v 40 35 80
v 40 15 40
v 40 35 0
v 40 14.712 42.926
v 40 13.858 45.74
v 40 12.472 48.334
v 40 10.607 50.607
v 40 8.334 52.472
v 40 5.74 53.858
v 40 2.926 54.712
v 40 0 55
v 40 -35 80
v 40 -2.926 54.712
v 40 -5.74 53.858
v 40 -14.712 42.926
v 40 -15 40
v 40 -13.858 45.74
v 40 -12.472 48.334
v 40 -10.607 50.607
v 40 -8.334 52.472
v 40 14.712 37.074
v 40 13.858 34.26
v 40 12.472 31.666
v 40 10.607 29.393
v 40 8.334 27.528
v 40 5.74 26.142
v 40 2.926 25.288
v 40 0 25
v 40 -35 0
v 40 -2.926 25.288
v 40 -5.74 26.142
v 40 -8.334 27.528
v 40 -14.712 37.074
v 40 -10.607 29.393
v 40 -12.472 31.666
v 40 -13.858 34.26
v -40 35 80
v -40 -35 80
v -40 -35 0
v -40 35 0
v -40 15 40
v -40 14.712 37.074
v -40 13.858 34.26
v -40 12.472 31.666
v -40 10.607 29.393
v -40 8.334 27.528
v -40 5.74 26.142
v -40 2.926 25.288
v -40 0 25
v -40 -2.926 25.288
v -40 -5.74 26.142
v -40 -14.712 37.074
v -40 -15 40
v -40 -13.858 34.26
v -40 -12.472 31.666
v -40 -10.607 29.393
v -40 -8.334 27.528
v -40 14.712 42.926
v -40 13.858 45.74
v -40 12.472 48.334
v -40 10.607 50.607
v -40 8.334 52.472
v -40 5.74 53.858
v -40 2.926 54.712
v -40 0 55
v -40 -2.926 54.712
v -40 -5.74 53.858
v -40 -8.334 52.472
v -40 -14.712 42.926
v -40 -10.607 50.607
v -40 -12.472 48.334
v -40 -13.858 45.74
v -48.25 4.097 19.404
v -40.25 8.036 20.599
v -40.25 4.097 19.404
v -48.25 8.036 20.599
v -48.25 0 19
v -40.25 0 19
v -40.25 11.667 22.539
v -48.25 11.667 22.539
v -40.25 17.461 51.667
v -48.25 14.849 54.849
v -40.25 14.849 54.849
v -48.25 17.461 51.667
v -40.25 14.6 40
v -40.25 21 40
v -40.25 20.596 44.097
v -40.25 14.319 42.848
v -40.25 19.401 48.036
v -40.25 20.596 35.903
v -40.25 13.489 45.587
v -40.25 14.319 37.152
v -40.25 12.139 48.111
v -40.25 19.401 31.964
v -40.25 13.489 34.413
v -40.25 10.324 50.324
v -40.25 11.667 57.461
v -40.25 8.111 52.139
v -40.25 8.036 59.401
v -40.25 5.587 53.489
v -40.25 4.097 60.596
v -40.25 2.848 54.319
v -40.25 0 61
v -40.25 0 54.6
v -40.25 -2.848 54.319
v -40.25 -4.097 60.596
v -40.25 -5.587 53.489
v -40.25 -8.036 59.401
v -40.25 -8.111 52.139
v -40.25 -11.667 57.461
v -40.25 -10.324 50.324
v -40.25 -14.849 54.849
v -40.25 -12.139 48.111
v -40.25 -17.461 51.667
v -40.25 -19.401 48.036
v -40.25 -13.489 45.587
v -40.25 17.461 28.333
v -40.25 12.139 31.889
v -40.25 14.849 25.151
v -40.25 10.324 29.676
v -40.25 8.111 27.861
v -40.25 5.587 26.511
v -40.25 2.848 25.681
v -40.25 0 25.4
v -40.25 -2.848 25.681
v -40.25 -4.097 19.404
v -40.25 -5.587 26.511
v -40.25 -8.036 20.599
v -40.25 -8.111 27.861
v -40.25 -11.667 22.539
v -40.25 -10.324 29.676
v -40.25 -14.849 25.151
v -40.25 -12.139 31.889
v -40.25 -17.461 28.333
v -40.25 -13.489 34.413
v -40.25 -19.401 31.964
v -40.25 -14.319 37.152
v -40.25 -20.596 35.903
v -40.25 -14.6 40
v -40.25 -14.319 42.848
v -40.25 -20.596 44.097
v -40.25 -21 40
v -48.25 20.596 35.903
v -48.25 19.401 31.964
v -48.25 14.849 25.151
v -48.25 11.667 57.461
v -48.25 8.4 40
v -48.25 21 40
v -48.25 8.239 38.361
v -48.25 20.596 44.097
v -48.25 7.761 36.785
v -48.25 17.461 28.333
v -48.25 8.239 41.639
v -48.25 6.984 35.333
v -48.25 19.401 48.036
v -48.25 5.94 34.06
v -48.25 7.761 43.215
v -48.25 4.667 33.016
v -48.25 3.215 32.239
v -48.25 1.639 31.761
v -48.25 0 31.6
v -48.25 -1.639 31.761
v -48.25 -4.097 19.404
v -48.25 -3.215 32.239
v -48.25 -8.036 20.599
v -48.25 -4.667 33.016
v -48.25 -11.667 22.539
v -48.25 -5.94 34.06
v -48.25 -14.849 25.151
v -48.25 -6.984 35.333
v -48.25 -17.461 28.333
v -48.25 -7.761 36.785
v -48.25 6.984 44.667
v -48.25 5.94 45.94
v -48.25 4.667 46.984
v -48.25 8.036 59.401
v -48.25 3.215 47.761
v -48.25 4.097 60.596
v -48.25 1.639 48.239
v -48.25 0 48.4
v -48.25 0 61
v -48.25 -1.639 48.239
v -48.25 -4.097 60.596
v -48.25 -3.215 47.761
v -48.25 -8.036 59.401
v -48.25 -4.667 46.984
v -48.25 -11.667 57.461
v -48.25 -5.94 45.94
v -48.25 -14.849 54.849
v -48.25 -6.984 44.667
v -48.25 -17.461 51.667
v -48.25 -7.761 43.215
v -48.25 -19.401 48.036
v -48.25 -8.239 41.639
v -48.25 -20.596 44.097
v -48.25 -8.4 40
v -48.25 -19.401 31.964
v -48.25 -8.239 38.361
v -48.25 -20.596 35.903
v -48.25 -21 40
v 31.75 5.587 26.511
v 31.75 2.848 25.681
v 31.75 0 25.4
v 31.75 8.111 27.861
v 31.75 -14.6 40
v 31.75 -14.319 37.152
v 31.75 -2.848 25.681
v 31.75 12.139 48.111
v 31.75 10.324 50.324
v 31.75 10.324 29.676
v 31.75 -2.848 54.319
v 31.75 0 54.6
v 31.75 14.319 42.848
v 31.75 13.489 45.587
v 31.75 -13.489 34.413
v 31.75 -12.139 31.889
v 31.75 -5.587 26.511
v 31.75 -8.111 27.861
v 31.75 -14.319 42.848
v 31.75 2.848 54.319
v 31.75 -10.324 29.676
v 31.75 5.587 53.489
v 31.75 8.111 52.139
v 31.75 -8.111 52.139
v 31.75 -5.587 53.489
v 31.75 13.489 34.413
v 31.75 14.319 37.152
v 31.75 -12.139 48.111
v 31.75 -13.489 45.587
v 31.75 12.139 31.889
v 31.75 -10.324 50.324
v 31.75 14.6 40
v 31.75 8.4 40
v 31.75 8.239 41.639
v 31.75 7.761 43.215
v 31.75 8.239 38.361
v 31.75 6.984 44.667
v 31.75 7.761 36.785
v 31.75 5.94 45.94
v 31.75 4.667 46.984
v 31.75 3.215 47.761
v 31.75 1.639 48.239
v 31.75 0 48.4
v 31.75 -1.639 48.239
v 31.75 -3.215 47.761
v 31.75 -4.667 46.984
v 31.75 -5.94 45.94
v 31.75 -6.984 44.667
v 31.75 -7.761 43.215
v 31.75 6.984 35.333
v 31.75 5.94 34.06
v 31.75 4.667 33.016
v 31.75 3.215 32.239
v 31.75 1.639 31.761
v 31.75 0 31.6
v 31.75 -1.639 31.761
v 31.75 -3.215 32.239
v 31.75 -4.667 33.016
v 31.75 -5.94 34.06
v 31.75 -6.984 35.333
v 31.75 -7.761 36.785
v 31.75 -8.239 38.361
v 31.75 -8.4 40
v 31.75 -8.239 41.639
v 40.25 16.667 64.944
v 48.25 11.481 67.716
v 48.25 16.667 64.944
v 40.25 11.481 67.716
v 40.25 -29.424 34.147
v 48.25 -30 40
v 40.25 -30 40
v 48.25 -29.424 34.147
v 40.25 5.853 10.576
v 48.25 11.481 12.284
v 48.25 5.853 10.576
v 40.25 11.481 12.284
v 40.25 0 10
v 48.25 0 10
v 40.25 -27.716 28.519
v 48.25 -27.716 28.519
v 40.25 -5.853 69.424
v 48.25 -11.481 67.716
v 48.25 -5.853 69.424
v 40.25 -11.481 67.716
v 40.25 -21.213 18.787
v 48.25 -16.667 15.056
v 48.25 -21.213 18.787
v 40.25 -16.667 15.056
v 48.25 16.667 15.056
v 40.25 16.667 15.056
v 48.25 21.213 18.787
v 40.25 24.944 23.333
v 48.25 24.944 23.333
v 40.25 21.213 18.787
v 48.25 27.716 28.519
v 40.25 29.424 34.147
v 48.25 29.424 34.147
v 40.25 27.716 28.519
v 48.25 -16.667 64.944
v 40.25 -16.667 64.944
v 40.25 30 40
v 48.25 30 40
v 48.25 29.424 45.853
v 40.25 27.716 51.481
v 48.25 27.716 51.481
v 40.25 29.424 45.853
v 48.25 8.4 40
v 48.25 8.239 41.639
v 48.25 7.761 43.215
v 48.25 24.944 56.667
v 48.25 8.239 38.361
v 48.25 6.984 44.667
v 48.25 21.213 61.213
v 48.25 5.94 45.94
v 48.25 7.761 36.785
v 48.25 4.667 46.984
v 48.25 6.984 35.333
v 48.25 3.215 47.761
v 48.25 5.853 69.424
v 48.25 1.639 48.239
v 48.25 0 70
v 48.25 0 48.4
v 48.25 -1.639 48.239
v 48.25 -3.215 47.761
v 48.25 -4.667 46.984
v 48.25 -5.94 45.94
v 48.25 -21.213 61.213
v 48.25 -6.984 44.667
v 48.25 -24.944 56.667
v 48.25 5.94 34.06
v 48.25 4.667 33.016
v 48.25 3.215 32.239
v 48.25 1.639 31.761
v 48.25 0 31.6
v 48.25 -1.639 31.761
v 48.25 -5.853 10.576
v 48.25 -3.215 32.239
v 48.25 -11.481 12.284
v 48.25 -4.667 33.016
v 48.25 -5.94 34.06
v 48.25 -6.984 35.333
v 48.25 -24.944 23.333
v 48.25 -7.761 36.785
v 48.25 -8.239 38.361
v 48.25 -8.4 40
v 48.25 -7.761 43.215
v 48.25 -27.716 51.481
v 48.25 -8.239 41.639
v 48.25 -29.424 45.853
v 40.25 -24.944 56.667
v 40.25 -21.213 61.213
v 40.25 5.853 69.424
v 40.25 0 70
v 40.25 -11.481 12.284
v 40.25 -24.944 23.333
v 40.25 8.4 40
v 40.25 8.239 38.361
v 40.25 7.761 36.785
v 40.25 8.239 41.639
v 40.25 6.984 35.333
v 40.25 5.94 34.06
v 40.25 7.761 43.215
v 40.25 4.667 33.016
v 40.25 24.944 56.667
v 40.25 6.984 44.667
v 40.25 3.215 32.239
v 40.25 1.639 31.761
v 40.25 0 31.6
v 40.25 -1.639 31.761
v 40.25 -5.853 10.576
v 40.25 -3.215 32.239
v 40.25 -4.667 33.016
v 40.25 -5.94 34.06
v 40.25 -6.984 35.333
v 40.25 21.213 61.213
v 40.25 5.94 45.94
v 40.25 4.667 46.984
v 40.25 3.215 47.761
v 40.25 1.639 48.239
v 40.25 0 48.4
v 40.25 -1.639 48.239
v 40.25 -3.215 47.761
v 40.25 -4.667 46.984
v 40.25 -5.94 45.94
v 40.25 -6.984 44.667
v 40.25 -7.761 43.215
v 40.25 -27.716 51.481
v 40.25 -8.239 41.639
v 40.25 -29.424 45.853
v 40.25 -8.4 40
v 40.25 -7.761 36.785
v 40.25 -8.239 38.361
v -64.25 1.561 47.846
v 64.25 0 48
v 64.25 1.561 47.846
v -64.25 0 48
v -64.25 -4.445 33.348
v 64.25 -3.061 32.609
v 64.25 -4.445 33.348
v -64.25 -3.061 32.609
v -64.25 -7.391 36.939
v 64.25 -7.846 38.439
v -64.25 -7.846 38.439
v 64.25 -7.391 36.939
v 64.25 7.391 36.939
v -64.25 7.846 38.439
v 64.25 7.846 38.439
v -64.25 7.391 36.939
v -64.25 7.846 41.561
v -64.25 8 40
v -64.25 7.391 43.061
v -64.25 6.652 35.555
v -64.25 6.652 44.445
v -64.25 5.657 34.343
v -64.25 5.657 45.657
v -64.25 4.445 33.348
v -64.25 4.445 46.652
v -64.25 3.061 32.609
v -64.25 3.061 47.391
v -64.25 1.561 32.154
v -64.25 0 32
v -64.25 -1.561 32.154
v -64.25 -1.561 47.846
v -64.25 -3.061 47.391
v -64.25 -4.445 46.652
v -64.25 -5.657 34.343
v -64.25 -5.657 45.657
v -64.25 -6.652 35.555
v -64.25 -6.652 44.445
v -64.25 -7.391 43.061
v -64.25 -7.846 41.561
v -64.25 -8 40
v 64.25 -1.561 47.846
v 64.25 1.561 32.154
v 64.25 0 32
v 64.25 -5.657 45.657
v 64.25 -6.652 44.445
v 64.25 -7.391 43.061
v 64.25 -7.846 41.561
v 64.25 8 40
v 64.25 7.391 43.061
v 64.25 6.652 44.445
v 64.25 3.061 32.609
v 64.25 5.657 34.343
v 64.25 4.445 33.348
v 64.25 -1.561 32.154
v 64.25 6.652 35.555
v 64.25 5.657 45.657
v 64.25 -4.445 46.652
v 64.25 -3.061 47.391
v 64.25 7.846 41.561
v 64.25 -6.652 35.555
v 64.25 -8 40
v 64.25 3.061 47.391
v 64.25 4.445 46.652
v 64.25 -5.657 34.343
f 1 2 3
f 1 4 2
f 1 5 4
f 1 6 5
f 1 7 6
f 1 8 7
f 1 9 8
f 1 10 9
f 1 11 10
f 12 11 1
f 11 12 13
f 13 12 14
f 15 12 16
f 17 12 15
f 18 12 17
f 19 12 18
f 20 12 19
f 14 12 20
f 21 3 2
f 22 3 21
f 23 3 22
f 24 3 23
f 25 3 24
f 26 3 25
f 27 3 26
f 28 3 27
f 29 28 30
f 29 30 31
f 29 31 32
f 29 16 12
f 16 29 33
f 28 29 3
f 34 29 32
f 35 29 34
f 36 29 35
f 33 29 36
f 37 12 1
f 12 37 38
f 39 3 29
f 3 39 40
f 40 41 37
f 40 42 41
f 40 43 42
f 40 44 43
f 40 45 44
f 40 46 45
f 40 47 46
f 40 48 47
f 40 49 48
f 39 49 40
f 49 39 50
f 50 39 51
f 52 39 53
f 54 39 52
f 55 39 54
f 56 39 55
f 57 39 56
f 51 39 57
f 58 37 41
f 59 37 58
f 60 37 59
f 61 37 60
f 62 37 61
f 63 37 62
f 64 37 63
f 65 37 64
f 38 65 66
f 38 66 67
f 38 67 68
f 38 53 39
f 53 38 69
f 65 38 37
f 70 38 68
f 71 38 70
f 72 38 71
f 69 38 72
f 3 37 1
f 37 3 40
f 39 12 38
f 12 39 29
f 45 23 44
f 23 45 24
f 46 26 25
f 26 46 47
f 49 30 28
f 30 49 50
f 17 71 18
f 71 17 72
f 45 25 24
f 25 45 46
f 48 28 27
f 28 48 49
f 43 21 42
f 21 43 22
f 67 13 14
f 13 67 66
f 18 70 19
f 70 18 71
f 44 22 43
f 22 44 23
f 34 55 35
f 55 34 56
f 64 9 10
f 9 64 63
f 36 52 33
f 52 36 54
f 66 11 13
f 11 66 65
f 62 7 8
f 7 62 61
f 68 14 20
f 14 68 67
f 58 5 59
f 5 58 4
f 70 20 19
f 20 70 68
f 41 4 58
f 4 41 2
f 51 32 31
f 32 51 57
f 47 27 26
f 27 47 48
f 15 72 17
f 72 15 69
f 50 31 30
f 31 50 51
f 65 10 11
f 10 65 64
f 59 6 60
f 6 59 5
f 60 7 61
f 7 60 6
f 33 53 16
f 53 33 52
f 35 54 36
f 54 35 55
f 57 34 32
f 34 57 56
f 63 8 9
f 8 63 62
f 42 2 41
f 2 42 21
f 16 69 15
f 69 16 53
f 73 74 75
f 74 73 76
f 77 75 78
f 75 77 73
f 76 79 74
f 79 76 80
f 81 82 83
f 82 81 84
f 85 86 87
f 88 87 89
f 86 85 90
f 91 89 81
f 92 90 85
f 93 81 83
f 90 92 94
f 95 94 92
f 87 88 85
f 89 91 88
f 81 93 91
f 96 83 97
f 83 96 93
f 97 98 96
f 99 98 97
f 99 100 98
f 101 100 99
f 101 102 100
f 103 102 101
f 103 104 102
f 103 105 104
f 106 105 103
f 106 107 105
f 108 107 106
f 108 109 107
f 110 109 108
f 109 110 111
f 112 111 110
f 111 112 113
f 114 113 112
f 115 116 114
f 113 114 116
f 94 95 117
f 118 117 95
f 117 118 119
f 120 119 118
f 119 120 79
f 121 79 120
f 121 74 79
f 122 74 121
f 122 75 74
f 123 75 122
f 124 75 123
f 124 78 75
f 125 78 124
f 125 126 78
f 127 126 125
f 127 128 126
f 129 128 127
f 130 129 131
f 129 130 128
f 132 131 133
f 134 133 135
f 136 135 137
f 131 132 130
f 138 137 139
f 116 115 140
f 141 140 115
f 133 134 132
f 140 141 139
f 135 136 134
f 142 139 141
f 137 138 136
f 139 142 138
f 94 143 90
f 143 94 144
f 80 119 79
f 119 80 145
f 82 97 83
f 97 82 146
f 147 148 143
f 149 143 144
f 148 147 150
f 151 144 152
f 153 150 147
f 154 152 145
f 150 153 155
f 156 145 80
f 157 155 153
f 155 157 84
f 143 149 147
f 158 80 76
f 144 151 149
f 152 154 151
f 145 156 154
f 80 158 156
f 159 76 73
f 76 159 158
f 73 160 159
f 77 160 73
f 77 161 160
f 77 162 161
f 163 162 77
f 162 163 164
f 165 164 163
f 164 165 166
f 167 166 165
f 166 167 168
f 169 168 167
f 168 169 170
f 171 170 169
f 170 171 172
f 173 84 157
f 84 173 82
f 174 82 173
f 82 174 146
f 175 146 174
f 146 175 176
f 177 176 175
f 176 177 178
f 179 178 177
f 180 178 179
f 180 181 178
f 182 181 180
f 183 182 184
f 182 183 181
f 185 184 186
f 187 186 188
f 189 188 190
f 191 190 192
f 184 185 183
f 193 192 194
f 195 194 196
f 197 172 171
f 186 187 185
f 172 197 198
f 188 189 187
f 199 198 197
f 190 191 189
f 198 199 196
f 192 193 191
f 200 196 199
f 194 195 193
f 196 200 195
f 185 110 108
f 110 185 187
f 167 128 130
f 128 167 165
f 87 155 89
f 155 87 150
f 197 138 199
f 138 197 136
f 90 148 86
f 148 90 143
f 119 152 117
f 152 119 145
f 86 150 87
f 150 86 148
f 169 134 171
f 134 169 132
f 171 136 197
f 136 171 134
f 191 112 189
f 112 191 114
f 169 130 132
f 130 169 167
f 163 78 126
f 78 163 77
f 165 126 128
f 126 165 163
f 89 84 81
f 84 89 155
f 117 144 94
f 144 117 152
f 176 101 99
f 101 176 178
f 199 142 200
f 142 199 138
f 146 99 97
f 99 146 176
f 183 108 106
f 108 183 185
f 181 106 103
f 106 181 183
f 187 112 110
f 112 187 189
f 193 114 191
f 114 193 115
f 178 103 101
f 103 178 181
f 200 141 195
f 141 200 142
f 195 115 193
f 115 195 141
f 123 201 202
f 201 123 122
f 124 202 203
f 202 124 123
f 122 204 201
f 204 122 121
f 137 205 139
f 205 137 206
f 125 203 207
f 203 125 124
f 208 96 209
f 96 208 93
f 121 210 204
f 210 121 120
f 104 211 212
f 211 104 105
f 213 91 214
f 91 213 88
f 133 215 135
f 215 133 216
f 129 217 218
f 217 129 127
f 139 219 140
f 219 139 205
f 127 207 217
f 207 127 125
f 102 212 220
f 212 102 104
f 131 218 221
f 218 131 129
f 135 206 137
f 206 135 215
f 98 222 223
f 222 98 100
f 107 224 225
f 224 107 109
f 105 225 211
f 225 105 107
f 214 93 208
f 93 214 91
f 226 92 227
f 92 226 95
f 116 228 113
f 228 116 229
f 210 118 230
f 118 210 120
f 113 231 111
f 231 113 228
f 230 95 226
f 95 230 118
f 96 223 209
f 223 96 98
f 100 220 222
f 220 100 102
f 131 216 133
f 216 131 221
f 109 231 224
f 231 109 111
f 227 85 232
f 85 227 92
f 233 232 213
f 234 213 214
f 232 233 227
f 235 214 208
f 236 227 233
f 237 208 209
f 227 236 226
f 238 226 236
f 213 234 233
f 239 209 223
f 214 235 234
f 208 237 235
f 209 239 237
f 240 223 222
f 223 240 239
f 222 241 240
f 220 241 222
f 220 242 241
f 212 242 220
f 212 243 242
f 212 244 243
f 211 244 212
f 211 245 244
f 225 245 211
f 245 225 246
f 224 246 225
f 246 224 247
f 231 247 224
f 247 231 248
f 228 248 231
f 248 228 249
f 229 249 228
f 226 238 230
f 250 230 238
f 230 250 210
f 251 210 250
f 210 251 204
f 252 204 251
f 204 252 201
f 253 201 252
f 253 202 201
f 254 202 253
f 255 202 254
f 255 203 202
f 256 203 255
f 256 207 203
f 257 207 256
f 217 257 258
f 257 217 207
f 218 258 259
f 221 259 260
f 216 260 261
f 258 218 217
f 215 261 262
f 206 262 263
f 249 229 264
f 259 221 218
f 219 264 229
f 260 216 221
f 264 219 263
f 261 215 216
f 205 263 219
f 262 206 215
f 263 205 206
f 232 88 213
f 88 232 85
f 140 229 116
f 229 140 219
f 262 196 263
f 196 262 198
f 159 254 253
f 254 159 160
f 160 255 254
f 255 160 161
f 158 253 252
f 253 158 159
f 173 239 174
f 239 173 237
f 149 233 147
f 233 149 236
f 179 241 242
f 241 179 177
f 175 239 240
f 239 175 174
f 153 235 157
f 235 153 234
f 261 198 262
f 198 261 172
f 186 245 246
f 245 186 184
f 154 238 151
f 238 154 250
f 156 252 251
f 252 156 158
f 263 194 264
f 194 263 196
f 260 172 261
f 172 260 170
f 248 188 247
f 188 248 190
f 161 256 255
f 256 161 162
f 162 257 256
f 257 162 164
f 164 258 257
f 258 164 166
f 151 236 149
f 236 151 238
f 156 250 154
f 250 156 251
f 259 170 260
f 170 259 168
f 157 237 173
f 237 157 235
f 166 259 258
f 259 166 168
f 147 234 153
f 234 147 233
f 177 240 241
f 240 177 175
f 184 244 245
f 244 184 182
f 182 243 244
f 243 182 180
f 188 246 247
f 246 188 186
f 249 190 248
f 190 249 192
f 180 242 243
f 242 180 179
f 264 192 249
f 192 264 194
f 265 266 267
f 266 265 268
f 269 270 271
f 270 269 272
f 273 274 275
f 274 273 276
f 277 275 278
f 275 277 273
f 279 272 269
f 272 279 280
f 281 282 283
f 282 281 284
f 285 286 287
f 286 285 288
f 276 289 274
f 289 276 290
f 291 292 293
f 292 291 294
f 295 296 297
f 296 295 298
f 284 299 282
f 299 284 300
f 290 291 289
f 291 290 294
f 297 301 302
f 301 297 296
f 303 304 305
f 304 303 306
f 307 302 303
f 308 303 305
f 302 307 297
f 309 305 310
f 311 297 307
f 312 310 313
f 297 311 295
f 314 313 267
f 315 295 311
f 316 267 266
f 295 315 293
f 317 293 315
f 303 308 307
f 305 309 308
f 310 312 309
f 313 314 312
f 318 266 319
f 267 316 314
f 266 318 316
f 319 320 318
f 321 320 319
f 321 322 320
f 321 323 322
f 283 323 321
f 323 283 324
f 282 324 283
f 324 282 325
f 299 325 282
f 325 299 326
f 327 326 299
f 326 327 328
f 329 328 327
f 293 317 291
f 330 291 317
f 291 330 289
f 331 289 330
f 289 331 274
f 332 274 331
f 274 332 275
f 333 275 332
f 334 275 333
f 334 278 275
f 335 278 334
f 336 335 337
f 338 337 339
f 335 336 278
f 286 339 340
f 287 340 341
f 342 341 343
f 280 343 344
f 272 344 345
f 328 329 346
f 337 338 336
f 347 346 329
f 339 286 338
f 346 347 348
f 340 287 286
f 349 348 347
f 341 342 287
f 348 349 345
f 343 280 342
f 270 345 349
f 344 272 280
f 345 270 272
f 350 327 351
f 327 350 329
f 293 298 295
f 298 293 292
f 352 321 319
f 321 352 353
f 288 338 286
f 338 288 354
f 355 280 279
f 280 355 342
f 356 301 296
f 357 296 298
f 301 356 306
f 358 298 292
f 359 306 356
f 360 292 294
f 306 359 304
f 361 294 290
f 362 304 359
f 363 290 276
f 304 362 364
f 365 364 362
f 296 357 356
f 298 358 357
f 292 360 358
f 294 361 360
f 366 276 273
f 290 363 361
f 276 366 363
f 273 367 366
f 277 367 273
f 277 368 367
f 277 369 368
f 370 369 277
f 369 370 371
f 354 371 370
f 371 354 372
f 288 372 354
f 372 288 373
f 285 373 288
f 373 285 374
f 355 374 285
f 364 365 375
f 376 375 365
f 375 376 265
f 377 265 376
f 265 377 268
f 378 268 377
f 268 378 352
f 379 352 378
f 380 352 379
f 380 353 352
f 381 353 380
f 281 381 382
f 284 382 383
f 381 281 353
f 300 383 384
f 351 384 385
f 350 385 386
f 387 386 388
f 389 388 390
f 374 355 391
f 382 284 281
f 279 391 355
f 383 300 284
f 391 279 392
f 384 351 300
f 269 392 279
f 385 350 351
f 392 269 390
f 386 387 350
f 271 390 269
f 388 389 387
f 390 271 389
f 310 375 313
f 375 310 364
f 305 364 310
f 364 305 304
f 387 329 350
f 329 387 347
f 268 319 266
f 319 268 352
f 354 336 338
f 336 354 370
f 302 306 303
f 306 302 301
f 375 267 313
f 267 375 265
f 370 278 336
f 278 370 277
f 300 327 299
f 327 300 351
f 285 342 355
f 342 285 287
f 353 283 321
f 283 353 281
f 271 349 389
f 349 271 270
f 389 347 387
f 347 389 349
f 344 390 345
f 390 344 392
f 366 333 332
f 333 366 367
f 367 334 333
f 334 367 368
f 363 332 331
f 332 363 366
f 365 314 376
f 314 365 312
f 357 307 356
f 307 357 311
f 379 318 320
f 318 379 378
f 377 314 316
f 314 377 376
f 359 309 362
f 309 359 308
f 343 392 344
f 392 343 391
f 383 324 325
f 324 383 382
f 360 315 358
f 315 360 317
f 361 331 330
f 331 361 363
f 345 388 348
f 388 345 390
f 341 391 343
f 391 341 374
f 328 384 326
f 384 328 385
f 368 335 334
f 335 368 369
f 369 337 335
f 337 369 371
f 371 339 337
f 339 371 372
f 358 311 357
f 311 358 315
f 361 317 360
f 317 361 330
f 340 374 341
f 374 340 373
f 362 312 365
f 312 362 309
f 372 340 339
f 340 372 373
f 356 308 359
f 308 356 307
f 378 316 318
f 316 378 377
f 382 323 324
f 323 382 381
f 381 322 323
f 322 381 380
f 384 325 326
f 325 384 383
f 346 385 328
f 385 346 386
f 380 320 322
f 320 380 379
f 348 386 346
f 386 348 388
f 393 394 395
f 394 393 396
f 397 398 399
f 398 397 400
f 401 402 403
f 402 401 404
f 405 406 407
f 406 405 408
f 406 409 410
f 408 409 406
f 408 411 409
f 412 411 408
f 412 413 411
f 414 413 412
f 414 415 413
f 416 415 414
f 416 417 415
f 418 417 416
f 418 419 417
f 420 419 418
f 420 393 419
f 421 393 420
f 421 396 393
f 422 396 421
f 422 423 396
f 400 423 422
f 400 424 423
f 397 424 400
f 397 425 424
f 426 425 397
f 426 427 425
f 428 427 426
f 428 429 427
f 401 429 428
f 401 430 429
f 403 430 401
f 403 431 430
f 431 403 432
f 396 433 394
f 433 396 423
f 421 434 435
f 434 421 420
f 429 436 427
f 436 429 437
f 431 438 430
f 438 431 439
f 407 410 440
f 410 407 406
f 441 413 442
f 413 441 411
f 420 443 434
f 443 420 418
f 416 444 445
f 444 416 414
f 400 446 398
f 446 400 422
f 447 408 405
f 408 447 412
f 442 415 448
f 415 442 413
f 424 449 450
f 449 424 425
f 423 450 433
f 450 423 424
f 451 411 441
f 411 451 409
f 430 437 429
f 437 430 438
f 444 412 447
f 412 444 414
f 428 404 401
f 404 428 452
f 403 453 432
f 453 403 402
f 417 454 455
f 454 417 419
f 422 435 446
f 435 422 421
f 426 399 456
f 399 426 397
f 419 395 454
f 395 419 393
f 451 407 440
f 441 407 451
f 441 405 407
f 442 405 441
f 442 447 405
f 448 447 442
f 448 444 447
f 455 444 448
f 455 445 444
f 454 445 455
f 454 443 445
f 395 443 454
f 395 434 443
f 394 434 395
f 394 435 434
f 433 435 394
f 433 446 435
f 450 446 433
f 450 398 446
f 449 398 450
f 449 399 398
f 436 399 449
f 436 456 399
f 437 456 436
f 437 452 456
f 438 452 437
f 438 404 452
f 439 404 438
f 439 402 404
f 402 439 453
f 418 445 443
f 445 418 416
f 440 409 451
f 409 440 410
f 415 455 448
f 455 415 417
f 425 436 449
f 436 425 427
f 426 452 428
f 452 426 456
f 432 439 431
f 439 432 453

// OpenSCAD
$fn = 32;

// ------------------------------------------------------------------------
// Bushed housing: 80 x 70 x 80 mm housing, bushing d29.2
// Every part is its own module, assembly() places them once.
// ------------------------------------------------------------------------

// --- part 1 ---
module housing() {
  difference() {
    translate([-40, -35, 0]) cube([80, 70, 80]);
    translate([0, 0, 40]) rotate([0, 90, 0]) cylinder(h = 82, d = 30, center = true);
  }
}

// --- part 2 ---
module bushing() {
  difference() {
    union() {
      cylinder(h = 8, d = 42);
      translate([0, 0, 8]) cylinder(h = 72, d = 29.2);
    }
    translate([0, 0, -1]) cylinder(h = 82, d = 16.8);
  }
}

// --- part 3 ---
module shaft() {
  translate([0, 0, -64.25]) cylinder(h = 128.5, d = 16);
}

// --- part 4 ---
module cover() {
  difference() {
    cylinder(h = 8, d = 60);
    translate([0, 0, -1]) cylinder(h = 10, d = 16.8);
  }
}

// --- assembly ---
module assembly() {
  translate([0, 0, 0]) rotate([0, 0, 0]) housing();
  translate([-48.25, 0, 40]) rotate([0, 90, 0]) bushing();
  translate([0, 0, 40]) rotate([0, 90, 0]) shaft();
  translate([40.25, 0, 40]) rotate([0, 90, 0]) cover();
}

assembly();
